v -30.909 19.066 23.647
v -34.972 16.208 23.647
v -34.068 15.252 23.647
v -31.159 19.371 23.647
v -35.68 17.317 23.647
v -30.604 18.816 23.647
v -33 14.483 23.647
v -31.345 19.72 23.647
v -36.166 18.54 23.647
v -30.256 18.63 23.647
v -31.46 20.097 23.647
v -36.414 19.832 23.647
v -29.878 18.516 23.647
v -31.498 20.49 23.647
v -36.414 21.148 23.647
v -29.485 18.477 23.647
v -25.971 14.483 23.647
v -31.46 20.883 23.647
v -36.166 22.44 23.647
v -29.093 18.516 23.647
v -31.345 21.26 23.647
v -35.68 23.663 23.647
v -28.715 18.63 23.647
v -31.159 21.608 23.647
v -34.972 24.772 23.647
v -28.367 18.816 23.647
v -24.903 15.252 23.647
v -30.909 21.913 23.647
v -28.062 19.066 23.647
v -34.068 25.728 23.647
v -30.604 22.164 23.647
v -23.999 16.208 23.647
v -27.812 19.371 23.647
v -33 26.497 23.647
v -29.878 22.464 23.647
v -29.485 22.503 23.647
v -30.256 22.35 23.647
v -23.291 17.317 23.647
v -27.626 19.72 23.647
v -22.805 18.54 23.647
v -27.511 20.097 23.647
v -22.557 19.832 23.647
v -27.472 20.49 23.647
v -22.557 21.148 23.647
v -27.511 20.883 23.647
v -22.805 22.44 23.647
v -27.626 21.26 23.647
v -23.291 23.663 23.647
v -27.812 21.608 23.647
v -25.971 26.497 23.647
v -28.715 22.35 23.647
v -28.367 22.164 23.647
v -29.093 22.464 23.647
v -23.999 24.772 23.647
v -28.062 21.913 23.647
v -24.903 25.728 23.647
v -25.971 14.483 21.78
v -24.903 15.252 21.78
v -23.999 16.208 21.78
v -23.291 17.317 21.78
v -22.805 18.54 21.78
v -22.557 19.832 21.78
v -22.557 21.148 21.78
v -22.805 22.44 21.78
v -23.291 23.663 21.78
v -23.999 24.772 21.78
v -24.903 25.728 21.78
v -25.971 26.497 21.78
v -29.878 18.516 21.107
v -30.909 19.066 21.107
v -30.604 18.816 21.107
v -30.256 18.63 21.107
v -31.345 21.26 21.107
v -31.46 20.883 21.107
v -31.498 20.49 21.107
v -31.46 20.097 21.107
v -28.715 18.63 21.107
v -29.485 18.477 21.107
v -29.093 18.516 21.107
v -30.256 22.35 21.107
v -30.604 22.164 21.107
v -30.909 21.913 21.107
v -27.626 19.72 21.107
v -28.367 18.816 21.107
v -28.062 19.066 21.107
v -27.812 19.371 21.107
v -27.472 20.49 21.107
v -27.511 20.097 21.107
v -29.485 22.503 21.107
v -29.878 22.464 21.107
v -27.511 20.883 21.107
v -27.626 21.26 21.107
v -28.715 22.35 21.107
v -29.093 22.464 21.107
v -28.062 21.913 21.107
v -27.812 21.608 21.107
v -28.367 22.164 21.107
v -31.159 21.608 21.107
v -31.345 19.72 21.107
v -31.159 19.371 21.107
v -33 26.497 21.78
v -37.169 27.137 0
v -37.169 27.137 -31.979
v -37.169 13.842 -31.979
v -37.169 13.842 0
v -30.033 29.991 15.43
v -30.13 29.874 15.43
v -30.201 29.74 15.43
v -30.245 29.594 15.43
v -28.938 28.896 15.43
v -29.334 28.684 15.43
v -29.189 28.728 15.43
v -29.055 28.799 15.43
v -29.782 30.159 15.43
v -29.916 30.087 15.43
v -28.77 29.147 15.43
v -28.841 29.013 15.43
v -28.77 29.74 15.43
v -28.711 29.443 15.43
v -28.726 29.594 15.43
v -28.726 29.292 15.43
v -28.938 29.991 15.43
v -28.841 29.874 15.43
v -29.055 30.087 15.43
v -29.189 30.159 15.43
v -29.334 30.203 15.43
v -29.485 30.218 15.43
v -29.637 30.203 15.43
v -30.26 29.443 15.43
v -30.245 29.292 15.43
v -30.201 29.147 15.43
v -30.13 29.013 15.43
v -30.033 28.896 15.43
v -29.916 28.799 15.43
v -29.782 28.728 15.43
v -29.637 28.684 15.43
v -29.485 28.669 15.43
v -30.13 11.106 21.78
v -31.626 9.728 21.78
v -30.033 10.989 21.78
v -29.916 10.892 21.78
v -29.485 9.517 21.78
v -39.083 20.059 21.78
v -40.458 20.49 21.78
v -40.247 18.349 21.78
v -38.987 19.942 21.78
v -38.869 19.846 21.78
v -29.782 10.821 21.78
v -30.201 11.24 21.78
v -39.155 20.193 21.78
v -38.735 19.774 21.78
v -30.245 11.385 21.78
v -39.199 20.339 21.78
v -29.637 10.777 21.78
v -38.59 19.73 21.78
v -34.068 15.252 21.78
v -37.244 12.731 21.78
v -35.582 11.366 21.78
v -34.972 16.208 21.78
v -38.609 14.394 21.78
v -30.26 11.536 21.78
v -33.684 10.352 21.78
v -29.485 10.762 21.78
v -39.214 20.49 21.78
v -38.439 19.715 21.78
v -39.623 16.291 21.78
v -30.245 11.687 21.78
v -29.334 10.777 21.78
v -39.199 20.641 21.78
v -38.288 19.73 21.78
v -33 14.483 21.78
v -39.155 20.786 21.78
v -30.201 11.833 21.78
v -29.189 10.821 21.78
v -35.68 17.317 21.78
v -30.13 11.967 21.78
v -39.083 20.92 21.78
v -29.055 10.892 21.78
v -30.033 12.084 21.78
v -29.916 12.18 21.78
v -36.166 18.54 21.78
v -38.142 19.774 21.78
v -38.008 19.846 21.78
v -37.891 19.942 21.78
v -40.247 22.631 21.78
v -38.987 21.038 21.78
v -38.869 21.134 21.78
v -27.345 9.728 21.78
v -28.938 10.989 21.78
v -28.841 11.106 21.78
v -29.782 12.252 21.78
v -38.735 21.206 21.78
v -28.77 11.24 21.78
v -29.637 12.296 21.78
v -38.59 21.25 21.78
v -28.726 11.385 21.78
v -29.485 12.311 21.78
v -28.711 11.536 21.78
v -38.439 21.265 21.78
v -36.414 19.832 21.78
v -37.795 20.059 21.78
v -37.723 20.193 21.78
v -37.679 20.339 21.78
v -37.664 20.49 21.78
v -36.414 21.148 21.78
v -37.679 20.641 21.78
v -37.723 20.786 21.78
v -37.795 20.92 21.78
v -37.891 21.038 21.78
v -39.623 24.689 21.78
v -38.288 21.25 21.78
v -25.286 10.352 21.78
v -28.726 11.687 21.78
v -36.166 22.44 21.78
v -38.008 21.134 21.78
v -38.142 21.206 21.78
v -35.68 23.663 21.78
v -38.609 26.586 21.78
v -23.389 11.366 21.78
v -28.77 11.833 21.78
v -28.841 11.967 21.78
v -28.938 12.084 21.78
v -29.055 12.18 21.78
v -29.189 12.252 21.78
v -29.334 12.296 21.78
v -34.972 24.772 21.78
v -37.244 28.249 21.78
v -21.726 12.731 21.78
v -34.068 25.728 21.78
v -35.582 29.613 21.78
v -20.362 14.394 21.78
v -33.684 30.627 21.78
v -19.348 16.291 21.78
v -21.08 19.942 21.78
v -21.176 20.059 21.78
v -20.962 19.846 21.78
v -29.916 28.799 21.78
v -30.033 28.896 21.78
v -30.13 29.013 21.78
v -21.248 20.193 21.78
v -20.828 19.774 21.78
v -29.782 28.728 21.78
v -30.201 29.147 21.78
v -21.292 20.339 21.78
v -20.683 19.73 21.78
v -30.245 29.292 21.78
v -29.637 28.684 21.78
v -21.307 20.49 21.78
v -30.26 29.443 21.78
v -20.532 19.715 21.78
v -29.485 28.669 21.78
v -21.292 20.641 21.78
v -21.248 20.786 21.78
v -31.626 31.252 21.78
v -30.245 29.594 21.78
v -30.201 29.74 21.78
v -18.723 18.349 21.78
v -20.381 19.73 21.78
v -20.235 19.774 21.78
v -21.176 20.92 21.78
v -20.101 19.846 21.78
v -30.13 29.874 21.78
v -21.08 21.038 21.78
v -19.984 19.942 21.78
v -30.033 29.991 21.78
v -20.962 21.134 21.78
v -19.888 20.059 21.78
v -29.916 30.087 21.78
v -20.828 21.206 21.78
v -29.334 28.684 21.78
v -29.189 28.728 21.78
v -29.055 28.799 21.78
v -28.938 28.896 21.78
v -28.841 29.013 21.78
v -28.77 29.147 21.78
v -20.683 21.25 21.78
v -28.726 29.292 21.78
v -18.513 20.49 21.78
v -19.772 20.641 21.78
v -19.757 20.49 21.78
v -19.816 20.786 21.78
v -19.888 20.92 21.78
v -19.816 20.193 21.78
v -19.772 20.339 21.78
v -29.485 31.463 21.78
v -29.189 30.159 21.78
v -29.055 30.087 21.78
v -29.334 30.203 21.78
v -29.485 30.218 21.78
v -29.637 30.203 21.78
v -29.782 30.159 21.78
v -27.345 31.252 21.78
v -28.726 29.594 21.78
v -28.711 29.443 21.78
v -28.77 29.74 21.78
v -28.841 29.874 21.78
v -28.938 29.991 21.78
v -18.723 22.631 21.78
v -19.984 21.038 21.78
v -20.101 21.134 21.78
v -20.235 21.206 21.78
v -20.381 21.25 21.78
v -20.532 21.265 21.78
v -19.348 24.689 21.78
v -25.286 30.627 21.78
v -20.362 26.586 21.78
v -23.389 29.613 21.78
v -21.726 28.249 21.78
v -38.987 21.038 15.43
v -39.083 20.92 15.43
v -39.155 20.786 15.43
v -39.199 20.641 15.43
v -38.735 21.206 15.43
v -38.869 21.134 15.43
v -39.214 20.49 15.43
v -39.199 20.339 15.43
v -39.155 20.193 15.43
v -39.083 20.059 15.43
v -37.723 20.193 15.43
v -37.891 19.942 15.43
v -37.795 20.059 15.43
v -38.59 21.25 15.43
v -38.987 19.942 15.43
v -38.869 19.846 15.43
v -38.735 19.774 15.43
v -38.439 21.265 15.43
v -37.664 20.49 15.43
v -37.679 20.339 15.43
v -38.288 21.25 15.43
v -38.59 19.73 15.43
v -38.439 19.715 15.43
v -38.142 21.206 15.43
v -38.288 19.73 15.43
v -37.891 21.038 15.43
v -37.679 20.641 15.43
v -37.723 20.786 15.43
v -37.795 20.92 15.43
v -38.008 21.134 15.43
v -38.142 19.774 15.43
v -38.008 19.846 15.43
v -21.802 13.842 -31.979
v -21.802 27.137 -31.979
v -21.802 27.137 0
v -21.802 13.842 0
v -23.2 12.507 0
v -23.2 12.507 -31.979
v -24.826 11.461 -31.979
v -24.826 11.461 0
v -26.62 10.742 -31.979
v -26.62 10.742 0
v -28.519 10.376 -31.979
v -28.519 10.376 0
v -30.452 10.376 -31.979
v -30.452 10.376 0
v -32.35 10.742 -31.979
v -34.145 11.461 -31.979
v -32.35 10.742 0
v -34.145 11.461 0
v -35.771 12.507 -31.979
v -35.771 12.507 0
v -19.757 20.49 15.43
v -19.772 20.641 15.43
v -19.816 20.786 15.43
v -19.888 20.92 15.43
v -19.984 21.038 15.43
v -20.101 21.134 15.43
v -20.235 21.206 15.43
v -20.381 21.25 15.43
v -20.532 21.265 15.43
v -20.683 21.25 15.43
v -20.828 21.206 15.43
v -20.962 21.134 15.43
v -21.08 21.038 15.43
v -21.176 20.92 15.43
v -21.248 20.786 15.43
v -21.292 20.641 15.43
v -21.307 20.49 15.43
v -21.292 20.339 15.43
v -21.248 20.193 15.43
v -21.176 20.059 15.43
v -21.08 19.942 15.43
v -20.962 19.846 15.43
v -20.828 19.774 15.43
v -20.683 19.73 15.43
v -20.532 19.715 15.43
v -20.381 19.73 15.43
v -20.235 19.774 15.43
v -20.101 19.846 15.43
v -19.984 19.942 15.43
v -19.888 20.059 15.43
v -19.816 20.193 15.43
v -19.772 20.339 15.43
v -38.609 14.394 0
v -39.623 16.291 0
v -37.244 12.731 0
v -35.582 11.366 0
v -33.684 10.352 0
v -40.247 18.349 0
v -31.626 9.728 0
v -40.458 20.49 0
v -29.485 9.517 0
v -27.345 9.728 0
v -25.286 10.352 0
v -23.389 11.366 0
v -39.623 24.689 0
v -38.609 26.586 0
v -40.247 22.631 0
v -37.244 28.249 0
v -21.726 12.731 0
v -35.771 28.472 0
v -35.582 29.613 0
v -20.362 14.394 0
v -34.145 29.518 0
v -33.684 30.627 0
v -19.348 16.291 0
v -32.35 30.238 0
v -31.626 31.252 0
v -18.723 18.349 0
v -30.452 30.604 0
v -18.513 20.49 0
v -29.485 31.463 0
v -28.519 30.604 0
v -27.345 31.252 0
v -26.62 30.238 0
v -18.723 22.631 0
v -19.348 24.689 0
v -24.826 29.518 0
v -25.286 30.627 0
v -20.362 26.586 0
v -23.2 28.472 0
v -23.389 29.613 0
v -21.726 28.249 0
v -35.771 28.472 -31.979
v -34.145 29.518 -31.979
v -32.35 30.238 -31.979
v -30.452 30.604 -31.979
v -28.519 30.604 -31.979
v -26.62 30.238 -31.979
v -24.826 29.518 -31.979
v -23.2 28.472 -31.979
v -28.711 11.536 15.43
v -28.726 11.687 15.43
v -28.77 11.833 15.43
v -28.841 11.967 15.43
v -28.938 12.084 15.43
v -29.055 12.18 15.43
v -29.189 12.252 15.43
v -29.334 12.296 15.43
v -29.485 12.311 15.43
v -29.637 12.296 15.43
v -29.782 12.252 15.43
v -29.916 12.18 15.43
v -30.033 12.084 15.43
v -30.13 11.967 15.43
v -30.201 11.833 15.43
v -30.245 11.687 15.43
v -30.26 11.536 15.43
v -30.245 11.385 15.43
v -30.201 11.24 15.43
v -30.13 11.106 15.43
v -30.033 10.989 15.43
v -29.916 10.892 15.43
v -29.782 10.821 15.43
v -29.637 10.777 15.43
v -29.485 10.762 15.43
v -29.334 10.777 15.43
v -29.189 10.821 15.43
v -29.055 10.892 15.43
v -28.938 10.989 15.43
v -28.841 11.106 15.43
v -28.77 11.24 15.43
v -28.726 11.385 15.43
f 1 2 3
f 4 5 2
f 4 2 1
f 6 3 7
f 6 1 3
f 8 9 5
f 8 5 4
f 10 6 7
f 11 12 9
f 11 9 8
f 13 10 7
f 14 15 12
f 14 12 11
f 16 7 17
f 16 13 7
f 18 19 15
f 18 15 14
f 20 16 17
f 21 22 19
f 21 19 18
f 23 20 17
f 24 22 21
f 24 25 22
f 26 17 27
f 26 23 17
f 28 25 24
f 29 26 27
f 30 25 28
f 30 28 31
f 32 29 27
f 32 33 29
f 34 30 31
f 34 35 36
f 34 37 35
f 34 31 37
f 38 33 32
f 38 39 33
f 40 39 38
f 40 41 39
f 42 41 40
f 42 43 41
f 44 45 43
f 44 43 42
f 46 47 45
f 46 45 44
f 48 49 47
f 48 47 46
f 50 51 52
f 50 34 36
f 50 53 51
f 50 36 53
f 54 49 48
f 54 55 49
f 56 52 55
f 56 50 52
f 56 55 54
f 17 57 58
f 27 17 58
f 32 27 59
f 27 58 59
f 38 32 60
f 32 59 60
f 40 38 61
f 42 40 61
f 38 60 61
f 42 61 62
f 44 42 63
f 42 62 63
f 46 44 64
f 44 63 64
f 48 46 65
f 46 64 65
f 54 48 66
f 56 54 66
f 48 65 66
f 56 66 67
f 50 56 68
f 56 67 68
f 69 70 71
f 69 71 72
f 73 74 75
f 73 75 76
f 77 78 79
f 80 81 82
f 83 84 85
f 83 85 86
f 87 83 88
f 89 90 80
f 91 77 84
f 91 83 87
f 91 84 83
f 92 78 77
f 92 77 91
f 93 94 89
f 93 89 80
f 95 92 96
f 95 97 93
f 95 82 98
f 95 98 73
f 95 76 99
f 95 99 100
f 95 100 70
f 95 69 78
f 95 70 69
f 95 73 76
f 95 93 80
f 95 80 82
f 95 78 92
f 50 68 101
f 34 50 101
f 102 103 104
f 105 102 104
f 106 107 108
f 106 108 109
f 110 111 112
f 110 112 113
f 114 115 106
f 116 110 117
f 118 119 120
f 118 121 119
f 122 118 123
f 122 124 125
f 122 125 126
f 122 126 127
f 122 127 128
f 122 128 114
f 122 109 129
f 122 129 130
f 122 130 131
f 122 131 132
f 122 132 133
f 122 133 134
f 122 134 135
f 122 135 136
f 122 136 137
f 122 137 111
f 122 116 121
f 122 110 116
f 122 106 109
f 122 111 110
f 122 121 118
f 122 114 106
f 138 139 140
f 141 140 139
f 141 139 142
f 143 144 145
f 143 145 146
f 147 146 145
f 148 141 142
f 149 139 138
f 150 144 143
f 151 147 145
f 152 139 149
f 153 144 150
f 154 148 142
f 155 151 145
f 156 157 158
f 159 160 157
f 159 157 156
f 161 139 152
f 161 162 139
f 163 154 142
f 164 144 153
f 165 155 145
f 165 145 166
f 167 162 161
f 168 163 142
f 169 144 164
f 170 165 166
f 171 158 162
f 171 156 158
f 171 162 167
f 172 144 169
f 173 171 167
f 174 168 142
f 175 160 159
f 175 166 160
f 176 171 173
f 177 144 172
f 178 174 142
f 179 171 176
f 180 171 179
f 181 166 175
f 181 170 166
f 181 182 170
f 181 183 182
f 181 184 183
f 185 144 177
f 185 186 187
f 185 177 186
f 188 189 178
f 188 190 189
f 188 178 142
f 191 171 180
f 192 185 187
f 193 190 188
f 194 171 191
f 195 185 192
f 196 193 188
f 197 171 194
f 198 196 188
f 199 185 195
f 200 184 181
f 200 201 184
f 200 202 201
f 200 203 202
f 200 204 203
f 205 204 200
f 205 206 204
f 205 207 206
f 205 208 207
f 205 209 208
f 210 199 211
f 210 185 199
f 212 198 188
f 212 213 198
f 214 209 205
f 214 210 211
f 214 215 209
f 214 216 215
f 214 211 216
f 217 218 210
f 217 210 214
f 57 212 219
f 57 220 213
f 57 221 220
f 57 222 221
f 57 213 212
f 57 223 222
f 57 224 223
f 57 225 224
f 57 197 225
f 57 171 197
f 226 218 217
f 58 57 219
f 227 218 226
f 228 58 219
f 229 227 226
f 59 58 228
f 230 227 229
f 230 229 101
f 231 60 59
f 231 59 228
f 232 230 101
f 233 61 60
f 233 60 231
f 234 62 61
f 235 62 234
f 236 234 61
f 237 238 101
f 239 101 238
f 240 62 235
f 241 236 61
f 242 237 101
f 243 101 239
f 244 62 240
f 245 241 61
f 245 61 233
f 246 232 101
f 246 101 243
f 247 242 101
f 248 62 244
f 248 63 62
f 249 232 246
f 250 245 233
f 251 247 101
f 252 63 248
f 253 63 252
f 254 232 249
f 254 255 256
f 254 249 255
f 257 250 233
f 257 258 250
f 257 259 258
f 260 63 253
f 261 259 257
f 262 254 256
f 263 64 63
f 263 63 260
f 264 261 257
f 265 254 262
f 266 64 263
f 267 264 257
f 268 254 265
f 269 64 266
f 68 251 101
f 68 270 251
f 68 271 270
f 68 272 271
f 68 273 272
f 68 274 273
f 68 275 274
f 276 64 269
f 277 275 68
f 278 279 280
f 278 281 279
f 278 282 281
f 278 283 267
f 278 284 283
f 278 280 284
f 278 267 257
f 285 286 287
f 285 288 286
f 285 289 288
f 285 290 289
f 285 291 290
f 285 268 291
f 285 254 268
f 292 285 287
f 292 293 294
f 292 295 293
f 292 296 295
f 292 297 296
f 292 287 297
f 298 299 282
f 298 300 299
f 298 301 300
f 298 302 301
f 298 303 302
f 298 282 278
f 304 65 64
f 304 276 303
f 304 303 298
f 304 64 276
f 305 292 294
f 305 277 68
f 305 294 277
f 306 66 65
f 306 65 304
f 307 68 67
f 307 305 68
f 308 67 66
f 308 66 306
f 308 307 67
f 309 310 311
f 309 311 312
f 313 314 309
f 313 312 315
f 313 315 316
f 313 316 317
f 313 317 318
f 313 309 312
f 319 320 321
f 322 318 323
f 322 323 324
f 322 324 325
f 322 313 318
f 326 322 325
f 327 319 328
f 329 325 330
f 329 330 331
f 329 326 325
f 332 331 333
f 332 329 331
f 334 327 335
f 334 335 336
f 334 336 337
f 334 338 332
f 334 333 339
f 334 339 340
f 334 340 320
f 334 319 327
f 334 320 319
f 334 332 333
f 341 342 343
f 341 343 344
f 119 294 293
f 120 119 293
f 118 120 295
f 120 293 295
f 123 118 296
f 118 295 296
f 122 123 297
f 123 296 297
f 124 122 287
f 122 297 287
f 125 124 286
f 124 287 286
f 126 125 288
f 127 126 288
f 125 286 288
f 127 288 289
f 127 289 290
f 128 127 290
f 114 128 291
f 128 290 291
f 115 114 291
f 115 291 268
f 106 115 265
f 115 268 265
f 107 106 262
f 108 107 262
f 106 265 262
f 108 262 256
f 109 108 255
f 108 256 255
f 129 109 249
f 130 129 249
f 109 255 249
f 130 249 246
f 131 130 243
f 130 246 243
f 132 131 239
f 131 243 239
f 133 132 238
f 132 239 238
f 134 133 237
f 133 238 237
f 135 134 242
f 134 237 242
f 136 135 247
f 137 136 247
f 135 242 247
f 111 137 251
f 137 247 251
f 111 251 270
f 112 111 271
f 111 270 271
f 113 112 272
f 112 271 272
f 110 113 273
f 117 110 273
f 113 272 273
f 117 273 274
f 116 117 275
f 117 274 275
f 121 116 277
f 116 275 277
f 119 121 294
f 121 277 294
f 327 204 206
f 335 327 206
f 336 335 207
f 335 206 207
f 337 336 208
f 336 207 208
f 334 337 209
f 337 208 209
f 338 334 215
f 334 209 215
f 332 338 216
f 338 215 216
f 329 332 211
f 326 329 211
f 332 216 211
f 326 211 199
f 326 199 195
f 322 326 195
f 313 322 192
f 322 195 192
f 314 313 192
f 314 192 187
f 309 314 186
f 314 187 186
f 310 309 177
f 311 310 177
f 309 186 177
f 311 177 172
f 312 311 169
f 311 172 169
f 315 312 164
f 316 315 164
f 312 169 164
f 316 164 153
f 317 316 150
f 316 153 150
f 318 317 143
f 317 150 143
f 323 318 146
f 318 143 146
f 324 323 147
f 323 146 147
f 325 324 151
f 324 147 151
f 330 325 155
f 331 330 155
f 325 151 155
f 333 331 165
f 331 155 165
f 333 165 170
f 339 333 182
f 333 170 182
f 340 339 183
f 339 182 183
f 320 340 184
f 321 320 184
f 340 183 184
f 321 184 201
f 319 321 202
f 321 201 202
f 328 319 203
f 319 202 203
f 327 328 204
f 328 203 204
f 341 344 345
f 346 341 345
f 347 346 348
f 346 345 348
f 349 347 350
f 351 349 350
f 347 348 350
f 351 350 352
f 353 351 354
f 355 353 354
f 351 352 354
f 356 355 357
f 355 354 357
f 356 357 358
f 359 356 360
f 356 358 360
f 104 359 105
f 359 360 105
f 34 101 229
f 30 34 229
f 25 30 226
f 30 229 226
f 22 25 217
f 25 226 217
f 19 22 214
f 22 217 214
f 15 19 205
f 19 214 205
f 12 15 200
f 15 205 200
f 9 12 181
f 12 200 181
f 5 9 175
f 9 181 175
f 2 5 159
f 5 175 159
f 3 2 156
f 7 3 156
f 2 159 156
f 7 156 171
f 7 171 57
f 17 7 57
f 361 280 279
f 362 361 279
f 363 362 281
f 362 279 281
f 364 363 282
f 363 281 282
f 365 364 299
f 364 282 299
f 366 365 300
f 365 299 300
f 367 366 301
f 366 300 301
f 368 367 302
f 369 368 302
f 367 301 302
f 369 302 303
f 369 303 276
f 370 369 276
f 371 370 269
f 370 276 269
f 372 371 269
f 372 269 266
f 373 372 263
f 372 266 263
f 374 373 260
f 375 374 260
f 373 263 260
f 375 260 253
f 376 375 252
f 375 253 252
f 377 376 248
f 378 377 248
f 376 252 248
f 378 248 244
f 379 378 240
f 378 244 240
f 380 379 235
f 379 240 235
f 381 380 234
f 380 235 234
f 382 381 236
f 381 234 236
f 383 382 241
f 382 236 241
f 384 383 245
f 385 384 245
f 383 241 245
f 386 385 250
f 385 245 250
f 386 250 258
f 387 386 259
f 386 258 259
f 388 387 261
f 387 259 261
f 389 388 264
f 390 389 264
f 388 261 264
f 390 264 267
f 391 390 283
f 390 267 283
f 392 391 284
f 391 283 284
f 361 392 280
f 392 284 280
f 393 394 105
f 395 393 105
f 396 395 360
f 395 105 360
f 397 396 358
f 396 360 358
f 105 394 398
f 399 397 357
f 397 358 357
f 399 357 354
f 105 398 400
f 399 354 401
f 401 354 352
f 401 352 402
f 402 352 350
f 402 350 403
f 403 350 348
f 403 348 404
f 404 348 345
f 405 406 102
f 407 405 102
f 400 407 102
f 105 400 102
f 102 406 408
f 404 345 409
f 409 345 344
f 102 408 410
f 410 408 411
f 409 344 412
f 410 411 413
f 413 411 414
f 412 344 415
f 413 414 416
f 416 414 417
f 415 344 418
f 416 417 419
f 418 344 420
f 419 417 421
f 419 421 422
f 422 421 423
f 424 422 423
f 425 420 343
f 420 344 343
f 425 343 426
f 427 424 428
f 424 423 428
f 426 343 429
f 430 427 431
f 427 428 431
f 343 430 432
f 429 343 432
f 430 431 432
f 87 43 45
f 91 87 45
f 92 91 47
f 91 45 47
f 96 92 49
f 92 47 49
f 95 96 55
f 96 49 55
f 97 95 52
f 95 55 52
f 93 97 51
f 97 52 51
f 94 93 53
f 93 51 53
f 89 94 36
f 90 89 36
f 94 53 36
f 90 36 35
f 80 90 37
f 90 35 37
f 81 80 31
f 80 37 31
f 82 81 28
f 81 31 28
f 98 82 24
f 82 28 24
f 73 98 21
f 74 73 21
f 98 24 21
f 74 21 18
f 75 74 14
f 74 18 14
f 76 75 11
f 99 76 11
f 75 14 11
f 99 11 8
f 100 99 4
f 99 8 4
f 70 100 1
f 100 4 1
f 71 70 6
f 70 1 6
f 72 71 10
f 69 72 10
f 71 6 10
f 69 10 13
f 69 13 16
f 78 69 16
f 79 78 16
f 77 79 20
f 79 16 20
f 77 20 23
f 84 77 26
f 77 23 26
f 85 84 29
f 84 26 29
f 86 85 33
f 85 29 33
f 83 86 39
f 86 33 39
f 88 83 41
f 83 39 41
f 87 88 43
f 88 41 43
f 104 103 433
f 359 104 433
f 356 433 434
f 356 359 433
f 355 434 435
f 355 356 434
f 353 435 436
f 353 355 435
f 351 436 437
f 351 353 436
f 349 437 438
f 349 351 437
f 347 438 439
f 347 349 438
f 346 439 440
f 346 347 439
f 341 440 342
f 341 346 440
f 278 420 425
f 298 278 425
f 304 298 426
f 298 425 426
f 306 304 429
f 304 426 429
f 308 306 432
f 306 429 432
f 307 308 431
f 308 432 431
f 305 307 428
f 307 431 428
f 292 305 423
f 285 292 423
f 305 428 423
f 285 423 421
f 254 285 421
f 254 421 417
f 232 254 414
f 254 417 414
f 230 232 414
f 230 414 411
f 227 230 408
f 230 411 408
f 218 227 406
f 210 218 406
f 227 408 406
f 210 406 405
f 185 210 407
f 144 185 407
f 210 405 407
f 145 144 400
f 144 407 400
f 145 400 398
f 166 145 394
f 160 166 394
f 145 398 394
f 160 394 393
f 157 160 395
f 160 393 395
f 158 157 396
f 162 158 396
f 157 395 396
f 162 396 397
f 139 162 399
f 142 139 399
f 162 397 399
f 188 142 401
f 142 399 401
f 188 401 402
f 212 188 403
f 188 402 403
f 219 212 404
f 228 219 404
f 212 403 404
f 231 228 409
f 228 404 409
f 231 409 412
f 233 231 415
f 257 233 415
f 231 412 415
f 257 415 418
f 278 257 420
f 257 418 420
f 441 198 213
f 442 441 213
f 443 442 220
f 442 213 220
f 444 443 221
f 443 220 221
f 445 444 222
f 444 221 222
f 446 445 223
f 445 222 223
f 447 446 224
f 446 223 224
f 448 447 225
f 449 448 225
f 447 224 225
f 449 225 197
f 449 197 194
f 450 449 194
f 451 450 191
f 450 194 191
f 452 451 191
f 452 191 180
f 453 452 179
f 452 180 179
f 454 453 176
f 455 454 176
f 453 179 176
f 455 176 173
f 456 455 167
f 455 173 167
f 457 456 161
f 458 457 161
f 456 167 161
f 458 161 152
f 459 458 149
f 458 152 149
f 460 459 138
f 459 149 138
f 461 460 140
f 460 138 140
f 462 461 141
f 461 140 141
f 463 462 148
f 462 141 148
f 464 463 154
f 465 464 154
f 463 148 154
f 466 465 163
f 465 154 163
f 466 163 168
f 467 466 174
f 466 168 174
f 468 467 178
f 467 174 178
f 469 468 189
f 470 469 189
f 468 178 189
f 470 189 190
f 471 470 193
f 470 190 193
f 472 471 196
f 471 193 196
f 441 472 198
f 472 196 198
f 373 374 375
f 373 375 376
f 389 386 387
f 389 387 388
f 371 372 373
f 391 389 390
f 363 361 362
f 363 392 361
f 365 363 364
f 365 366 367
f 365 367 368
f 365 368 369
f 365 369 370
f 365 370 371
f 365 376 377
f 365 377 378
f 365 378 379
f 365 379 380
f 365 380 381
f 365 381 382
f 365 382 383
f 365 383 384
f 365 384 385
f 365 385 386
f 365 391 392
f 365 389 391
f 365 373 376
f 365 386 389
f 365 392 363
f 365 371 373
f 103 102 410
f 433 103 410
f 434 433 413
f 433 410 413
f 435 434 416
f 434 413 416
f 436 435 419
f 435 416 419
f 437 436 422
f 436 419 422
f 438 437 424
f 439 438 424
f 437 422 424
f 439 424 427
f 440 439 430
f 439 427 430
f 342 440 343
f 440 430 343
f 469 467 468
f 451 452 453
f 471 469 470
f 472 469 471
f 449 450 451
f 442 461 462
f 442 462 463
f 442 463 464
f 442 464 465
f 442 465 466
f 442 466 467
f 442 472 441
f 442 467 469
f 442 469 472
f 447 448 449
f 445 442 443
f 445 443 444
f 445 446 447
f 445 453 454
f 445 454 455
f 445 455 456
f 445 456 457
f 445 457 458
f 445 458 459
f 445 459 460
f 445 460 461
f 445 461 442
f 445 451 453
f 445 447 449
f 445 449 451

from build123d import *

# Parameters (mm, degrees)
F0_R     = 10.9728
F1_DEPTH = 21.7805
F2_R     = 0.7747
F3_DEPTH = 6.35
F5_DEPTH = 1.8669
F6_R     = 2.01295
F7_DEPTH = 2.54
F8_W     = 15.367
F8_H     = 13.295026
F9_DEPTH = 31.9786


with BuildPart() as f1:
    # F0 (on Top) → F1 (new body)
    with BuildSketch(Plane.XY):
        with Locations((-29.485371, 20.489834)):
            Circle(F0_R)
    extrude(amount=F1_DEPTH)

    # F2 (on face) → F3 (cut)
    with BuildSketch(Plane.XY.offset(21.7805)):
        with Locations((-38.438871, 20.489834)):
            Circle(F2_R)
        with Locations((-29.485371, 11.536334)):
            Circle(F2_R)
        with Locations((-20.531871, 20.489834)):
            Circle(F2_R)
        with Locations((-29.485371, 29.443334)):
            Circle(F2_R)
    extrude(amount=-F3_DEPTH, mode=Mode.SUBTRACT)

    # F4 (on face) → F5 (join)
    with BuildSketch(Plane.XY.offset(21.7805)):
        with BuildLine():
            Line((-32.999739, 14.482734), (-25.971003, 14.482734))
            ThreePointArc((-25.971003, 14.482734), (-22.525771, 20.489834), (-25.971003, 26.496934))
            Line((-25.971003, 26.496934), (-32.999739, 26.496934))
            ThreePointArc((-32.999739, 26.496934), (-36.444971, 20.489834), (-32.999739, 14.482734))
        make_face()
    extrude(amount=F5_DEPTH)

    # F6 (on face) → F7 (cut)
    with BuildSketch(Plane.XY.offset(23.6474)):
        with Locations((-29.485371, 20.489834)):
            Circle(F6_R)
    extrude(amount=-F7_DEPTH, mode=Mode.SUBTRACT)

    # F8 (on face) → F9 (join)
    with BuildSketch(Plane(origin=(0, 0, 0), x_dir=(1, 0, 0), z_dir=(0, 0, -1))):
        with BuildLine():
            ThreePointArc((-37.168871, -27.137347), (-29.485371, -30.649834), (-21.801871, -27.137347))
            Line((-21.801871, -27.137347), (-37.168871, -27.137347))
        make_face()
        with Locations((-29.485371, -20.489834)):
            Rectangle(F8_W, F8_H)
        with BuildLine():
            Line((-37.168871, -13.842321), (-21.801871, -13.842321))
            ThreePointArc((-21.801871, -13.842321), (-29.485371, -10.329834), (-37.168871, -13.842321))
        make_face()
    extrude(amount=F9_DEPTH)


solid = f1.part
